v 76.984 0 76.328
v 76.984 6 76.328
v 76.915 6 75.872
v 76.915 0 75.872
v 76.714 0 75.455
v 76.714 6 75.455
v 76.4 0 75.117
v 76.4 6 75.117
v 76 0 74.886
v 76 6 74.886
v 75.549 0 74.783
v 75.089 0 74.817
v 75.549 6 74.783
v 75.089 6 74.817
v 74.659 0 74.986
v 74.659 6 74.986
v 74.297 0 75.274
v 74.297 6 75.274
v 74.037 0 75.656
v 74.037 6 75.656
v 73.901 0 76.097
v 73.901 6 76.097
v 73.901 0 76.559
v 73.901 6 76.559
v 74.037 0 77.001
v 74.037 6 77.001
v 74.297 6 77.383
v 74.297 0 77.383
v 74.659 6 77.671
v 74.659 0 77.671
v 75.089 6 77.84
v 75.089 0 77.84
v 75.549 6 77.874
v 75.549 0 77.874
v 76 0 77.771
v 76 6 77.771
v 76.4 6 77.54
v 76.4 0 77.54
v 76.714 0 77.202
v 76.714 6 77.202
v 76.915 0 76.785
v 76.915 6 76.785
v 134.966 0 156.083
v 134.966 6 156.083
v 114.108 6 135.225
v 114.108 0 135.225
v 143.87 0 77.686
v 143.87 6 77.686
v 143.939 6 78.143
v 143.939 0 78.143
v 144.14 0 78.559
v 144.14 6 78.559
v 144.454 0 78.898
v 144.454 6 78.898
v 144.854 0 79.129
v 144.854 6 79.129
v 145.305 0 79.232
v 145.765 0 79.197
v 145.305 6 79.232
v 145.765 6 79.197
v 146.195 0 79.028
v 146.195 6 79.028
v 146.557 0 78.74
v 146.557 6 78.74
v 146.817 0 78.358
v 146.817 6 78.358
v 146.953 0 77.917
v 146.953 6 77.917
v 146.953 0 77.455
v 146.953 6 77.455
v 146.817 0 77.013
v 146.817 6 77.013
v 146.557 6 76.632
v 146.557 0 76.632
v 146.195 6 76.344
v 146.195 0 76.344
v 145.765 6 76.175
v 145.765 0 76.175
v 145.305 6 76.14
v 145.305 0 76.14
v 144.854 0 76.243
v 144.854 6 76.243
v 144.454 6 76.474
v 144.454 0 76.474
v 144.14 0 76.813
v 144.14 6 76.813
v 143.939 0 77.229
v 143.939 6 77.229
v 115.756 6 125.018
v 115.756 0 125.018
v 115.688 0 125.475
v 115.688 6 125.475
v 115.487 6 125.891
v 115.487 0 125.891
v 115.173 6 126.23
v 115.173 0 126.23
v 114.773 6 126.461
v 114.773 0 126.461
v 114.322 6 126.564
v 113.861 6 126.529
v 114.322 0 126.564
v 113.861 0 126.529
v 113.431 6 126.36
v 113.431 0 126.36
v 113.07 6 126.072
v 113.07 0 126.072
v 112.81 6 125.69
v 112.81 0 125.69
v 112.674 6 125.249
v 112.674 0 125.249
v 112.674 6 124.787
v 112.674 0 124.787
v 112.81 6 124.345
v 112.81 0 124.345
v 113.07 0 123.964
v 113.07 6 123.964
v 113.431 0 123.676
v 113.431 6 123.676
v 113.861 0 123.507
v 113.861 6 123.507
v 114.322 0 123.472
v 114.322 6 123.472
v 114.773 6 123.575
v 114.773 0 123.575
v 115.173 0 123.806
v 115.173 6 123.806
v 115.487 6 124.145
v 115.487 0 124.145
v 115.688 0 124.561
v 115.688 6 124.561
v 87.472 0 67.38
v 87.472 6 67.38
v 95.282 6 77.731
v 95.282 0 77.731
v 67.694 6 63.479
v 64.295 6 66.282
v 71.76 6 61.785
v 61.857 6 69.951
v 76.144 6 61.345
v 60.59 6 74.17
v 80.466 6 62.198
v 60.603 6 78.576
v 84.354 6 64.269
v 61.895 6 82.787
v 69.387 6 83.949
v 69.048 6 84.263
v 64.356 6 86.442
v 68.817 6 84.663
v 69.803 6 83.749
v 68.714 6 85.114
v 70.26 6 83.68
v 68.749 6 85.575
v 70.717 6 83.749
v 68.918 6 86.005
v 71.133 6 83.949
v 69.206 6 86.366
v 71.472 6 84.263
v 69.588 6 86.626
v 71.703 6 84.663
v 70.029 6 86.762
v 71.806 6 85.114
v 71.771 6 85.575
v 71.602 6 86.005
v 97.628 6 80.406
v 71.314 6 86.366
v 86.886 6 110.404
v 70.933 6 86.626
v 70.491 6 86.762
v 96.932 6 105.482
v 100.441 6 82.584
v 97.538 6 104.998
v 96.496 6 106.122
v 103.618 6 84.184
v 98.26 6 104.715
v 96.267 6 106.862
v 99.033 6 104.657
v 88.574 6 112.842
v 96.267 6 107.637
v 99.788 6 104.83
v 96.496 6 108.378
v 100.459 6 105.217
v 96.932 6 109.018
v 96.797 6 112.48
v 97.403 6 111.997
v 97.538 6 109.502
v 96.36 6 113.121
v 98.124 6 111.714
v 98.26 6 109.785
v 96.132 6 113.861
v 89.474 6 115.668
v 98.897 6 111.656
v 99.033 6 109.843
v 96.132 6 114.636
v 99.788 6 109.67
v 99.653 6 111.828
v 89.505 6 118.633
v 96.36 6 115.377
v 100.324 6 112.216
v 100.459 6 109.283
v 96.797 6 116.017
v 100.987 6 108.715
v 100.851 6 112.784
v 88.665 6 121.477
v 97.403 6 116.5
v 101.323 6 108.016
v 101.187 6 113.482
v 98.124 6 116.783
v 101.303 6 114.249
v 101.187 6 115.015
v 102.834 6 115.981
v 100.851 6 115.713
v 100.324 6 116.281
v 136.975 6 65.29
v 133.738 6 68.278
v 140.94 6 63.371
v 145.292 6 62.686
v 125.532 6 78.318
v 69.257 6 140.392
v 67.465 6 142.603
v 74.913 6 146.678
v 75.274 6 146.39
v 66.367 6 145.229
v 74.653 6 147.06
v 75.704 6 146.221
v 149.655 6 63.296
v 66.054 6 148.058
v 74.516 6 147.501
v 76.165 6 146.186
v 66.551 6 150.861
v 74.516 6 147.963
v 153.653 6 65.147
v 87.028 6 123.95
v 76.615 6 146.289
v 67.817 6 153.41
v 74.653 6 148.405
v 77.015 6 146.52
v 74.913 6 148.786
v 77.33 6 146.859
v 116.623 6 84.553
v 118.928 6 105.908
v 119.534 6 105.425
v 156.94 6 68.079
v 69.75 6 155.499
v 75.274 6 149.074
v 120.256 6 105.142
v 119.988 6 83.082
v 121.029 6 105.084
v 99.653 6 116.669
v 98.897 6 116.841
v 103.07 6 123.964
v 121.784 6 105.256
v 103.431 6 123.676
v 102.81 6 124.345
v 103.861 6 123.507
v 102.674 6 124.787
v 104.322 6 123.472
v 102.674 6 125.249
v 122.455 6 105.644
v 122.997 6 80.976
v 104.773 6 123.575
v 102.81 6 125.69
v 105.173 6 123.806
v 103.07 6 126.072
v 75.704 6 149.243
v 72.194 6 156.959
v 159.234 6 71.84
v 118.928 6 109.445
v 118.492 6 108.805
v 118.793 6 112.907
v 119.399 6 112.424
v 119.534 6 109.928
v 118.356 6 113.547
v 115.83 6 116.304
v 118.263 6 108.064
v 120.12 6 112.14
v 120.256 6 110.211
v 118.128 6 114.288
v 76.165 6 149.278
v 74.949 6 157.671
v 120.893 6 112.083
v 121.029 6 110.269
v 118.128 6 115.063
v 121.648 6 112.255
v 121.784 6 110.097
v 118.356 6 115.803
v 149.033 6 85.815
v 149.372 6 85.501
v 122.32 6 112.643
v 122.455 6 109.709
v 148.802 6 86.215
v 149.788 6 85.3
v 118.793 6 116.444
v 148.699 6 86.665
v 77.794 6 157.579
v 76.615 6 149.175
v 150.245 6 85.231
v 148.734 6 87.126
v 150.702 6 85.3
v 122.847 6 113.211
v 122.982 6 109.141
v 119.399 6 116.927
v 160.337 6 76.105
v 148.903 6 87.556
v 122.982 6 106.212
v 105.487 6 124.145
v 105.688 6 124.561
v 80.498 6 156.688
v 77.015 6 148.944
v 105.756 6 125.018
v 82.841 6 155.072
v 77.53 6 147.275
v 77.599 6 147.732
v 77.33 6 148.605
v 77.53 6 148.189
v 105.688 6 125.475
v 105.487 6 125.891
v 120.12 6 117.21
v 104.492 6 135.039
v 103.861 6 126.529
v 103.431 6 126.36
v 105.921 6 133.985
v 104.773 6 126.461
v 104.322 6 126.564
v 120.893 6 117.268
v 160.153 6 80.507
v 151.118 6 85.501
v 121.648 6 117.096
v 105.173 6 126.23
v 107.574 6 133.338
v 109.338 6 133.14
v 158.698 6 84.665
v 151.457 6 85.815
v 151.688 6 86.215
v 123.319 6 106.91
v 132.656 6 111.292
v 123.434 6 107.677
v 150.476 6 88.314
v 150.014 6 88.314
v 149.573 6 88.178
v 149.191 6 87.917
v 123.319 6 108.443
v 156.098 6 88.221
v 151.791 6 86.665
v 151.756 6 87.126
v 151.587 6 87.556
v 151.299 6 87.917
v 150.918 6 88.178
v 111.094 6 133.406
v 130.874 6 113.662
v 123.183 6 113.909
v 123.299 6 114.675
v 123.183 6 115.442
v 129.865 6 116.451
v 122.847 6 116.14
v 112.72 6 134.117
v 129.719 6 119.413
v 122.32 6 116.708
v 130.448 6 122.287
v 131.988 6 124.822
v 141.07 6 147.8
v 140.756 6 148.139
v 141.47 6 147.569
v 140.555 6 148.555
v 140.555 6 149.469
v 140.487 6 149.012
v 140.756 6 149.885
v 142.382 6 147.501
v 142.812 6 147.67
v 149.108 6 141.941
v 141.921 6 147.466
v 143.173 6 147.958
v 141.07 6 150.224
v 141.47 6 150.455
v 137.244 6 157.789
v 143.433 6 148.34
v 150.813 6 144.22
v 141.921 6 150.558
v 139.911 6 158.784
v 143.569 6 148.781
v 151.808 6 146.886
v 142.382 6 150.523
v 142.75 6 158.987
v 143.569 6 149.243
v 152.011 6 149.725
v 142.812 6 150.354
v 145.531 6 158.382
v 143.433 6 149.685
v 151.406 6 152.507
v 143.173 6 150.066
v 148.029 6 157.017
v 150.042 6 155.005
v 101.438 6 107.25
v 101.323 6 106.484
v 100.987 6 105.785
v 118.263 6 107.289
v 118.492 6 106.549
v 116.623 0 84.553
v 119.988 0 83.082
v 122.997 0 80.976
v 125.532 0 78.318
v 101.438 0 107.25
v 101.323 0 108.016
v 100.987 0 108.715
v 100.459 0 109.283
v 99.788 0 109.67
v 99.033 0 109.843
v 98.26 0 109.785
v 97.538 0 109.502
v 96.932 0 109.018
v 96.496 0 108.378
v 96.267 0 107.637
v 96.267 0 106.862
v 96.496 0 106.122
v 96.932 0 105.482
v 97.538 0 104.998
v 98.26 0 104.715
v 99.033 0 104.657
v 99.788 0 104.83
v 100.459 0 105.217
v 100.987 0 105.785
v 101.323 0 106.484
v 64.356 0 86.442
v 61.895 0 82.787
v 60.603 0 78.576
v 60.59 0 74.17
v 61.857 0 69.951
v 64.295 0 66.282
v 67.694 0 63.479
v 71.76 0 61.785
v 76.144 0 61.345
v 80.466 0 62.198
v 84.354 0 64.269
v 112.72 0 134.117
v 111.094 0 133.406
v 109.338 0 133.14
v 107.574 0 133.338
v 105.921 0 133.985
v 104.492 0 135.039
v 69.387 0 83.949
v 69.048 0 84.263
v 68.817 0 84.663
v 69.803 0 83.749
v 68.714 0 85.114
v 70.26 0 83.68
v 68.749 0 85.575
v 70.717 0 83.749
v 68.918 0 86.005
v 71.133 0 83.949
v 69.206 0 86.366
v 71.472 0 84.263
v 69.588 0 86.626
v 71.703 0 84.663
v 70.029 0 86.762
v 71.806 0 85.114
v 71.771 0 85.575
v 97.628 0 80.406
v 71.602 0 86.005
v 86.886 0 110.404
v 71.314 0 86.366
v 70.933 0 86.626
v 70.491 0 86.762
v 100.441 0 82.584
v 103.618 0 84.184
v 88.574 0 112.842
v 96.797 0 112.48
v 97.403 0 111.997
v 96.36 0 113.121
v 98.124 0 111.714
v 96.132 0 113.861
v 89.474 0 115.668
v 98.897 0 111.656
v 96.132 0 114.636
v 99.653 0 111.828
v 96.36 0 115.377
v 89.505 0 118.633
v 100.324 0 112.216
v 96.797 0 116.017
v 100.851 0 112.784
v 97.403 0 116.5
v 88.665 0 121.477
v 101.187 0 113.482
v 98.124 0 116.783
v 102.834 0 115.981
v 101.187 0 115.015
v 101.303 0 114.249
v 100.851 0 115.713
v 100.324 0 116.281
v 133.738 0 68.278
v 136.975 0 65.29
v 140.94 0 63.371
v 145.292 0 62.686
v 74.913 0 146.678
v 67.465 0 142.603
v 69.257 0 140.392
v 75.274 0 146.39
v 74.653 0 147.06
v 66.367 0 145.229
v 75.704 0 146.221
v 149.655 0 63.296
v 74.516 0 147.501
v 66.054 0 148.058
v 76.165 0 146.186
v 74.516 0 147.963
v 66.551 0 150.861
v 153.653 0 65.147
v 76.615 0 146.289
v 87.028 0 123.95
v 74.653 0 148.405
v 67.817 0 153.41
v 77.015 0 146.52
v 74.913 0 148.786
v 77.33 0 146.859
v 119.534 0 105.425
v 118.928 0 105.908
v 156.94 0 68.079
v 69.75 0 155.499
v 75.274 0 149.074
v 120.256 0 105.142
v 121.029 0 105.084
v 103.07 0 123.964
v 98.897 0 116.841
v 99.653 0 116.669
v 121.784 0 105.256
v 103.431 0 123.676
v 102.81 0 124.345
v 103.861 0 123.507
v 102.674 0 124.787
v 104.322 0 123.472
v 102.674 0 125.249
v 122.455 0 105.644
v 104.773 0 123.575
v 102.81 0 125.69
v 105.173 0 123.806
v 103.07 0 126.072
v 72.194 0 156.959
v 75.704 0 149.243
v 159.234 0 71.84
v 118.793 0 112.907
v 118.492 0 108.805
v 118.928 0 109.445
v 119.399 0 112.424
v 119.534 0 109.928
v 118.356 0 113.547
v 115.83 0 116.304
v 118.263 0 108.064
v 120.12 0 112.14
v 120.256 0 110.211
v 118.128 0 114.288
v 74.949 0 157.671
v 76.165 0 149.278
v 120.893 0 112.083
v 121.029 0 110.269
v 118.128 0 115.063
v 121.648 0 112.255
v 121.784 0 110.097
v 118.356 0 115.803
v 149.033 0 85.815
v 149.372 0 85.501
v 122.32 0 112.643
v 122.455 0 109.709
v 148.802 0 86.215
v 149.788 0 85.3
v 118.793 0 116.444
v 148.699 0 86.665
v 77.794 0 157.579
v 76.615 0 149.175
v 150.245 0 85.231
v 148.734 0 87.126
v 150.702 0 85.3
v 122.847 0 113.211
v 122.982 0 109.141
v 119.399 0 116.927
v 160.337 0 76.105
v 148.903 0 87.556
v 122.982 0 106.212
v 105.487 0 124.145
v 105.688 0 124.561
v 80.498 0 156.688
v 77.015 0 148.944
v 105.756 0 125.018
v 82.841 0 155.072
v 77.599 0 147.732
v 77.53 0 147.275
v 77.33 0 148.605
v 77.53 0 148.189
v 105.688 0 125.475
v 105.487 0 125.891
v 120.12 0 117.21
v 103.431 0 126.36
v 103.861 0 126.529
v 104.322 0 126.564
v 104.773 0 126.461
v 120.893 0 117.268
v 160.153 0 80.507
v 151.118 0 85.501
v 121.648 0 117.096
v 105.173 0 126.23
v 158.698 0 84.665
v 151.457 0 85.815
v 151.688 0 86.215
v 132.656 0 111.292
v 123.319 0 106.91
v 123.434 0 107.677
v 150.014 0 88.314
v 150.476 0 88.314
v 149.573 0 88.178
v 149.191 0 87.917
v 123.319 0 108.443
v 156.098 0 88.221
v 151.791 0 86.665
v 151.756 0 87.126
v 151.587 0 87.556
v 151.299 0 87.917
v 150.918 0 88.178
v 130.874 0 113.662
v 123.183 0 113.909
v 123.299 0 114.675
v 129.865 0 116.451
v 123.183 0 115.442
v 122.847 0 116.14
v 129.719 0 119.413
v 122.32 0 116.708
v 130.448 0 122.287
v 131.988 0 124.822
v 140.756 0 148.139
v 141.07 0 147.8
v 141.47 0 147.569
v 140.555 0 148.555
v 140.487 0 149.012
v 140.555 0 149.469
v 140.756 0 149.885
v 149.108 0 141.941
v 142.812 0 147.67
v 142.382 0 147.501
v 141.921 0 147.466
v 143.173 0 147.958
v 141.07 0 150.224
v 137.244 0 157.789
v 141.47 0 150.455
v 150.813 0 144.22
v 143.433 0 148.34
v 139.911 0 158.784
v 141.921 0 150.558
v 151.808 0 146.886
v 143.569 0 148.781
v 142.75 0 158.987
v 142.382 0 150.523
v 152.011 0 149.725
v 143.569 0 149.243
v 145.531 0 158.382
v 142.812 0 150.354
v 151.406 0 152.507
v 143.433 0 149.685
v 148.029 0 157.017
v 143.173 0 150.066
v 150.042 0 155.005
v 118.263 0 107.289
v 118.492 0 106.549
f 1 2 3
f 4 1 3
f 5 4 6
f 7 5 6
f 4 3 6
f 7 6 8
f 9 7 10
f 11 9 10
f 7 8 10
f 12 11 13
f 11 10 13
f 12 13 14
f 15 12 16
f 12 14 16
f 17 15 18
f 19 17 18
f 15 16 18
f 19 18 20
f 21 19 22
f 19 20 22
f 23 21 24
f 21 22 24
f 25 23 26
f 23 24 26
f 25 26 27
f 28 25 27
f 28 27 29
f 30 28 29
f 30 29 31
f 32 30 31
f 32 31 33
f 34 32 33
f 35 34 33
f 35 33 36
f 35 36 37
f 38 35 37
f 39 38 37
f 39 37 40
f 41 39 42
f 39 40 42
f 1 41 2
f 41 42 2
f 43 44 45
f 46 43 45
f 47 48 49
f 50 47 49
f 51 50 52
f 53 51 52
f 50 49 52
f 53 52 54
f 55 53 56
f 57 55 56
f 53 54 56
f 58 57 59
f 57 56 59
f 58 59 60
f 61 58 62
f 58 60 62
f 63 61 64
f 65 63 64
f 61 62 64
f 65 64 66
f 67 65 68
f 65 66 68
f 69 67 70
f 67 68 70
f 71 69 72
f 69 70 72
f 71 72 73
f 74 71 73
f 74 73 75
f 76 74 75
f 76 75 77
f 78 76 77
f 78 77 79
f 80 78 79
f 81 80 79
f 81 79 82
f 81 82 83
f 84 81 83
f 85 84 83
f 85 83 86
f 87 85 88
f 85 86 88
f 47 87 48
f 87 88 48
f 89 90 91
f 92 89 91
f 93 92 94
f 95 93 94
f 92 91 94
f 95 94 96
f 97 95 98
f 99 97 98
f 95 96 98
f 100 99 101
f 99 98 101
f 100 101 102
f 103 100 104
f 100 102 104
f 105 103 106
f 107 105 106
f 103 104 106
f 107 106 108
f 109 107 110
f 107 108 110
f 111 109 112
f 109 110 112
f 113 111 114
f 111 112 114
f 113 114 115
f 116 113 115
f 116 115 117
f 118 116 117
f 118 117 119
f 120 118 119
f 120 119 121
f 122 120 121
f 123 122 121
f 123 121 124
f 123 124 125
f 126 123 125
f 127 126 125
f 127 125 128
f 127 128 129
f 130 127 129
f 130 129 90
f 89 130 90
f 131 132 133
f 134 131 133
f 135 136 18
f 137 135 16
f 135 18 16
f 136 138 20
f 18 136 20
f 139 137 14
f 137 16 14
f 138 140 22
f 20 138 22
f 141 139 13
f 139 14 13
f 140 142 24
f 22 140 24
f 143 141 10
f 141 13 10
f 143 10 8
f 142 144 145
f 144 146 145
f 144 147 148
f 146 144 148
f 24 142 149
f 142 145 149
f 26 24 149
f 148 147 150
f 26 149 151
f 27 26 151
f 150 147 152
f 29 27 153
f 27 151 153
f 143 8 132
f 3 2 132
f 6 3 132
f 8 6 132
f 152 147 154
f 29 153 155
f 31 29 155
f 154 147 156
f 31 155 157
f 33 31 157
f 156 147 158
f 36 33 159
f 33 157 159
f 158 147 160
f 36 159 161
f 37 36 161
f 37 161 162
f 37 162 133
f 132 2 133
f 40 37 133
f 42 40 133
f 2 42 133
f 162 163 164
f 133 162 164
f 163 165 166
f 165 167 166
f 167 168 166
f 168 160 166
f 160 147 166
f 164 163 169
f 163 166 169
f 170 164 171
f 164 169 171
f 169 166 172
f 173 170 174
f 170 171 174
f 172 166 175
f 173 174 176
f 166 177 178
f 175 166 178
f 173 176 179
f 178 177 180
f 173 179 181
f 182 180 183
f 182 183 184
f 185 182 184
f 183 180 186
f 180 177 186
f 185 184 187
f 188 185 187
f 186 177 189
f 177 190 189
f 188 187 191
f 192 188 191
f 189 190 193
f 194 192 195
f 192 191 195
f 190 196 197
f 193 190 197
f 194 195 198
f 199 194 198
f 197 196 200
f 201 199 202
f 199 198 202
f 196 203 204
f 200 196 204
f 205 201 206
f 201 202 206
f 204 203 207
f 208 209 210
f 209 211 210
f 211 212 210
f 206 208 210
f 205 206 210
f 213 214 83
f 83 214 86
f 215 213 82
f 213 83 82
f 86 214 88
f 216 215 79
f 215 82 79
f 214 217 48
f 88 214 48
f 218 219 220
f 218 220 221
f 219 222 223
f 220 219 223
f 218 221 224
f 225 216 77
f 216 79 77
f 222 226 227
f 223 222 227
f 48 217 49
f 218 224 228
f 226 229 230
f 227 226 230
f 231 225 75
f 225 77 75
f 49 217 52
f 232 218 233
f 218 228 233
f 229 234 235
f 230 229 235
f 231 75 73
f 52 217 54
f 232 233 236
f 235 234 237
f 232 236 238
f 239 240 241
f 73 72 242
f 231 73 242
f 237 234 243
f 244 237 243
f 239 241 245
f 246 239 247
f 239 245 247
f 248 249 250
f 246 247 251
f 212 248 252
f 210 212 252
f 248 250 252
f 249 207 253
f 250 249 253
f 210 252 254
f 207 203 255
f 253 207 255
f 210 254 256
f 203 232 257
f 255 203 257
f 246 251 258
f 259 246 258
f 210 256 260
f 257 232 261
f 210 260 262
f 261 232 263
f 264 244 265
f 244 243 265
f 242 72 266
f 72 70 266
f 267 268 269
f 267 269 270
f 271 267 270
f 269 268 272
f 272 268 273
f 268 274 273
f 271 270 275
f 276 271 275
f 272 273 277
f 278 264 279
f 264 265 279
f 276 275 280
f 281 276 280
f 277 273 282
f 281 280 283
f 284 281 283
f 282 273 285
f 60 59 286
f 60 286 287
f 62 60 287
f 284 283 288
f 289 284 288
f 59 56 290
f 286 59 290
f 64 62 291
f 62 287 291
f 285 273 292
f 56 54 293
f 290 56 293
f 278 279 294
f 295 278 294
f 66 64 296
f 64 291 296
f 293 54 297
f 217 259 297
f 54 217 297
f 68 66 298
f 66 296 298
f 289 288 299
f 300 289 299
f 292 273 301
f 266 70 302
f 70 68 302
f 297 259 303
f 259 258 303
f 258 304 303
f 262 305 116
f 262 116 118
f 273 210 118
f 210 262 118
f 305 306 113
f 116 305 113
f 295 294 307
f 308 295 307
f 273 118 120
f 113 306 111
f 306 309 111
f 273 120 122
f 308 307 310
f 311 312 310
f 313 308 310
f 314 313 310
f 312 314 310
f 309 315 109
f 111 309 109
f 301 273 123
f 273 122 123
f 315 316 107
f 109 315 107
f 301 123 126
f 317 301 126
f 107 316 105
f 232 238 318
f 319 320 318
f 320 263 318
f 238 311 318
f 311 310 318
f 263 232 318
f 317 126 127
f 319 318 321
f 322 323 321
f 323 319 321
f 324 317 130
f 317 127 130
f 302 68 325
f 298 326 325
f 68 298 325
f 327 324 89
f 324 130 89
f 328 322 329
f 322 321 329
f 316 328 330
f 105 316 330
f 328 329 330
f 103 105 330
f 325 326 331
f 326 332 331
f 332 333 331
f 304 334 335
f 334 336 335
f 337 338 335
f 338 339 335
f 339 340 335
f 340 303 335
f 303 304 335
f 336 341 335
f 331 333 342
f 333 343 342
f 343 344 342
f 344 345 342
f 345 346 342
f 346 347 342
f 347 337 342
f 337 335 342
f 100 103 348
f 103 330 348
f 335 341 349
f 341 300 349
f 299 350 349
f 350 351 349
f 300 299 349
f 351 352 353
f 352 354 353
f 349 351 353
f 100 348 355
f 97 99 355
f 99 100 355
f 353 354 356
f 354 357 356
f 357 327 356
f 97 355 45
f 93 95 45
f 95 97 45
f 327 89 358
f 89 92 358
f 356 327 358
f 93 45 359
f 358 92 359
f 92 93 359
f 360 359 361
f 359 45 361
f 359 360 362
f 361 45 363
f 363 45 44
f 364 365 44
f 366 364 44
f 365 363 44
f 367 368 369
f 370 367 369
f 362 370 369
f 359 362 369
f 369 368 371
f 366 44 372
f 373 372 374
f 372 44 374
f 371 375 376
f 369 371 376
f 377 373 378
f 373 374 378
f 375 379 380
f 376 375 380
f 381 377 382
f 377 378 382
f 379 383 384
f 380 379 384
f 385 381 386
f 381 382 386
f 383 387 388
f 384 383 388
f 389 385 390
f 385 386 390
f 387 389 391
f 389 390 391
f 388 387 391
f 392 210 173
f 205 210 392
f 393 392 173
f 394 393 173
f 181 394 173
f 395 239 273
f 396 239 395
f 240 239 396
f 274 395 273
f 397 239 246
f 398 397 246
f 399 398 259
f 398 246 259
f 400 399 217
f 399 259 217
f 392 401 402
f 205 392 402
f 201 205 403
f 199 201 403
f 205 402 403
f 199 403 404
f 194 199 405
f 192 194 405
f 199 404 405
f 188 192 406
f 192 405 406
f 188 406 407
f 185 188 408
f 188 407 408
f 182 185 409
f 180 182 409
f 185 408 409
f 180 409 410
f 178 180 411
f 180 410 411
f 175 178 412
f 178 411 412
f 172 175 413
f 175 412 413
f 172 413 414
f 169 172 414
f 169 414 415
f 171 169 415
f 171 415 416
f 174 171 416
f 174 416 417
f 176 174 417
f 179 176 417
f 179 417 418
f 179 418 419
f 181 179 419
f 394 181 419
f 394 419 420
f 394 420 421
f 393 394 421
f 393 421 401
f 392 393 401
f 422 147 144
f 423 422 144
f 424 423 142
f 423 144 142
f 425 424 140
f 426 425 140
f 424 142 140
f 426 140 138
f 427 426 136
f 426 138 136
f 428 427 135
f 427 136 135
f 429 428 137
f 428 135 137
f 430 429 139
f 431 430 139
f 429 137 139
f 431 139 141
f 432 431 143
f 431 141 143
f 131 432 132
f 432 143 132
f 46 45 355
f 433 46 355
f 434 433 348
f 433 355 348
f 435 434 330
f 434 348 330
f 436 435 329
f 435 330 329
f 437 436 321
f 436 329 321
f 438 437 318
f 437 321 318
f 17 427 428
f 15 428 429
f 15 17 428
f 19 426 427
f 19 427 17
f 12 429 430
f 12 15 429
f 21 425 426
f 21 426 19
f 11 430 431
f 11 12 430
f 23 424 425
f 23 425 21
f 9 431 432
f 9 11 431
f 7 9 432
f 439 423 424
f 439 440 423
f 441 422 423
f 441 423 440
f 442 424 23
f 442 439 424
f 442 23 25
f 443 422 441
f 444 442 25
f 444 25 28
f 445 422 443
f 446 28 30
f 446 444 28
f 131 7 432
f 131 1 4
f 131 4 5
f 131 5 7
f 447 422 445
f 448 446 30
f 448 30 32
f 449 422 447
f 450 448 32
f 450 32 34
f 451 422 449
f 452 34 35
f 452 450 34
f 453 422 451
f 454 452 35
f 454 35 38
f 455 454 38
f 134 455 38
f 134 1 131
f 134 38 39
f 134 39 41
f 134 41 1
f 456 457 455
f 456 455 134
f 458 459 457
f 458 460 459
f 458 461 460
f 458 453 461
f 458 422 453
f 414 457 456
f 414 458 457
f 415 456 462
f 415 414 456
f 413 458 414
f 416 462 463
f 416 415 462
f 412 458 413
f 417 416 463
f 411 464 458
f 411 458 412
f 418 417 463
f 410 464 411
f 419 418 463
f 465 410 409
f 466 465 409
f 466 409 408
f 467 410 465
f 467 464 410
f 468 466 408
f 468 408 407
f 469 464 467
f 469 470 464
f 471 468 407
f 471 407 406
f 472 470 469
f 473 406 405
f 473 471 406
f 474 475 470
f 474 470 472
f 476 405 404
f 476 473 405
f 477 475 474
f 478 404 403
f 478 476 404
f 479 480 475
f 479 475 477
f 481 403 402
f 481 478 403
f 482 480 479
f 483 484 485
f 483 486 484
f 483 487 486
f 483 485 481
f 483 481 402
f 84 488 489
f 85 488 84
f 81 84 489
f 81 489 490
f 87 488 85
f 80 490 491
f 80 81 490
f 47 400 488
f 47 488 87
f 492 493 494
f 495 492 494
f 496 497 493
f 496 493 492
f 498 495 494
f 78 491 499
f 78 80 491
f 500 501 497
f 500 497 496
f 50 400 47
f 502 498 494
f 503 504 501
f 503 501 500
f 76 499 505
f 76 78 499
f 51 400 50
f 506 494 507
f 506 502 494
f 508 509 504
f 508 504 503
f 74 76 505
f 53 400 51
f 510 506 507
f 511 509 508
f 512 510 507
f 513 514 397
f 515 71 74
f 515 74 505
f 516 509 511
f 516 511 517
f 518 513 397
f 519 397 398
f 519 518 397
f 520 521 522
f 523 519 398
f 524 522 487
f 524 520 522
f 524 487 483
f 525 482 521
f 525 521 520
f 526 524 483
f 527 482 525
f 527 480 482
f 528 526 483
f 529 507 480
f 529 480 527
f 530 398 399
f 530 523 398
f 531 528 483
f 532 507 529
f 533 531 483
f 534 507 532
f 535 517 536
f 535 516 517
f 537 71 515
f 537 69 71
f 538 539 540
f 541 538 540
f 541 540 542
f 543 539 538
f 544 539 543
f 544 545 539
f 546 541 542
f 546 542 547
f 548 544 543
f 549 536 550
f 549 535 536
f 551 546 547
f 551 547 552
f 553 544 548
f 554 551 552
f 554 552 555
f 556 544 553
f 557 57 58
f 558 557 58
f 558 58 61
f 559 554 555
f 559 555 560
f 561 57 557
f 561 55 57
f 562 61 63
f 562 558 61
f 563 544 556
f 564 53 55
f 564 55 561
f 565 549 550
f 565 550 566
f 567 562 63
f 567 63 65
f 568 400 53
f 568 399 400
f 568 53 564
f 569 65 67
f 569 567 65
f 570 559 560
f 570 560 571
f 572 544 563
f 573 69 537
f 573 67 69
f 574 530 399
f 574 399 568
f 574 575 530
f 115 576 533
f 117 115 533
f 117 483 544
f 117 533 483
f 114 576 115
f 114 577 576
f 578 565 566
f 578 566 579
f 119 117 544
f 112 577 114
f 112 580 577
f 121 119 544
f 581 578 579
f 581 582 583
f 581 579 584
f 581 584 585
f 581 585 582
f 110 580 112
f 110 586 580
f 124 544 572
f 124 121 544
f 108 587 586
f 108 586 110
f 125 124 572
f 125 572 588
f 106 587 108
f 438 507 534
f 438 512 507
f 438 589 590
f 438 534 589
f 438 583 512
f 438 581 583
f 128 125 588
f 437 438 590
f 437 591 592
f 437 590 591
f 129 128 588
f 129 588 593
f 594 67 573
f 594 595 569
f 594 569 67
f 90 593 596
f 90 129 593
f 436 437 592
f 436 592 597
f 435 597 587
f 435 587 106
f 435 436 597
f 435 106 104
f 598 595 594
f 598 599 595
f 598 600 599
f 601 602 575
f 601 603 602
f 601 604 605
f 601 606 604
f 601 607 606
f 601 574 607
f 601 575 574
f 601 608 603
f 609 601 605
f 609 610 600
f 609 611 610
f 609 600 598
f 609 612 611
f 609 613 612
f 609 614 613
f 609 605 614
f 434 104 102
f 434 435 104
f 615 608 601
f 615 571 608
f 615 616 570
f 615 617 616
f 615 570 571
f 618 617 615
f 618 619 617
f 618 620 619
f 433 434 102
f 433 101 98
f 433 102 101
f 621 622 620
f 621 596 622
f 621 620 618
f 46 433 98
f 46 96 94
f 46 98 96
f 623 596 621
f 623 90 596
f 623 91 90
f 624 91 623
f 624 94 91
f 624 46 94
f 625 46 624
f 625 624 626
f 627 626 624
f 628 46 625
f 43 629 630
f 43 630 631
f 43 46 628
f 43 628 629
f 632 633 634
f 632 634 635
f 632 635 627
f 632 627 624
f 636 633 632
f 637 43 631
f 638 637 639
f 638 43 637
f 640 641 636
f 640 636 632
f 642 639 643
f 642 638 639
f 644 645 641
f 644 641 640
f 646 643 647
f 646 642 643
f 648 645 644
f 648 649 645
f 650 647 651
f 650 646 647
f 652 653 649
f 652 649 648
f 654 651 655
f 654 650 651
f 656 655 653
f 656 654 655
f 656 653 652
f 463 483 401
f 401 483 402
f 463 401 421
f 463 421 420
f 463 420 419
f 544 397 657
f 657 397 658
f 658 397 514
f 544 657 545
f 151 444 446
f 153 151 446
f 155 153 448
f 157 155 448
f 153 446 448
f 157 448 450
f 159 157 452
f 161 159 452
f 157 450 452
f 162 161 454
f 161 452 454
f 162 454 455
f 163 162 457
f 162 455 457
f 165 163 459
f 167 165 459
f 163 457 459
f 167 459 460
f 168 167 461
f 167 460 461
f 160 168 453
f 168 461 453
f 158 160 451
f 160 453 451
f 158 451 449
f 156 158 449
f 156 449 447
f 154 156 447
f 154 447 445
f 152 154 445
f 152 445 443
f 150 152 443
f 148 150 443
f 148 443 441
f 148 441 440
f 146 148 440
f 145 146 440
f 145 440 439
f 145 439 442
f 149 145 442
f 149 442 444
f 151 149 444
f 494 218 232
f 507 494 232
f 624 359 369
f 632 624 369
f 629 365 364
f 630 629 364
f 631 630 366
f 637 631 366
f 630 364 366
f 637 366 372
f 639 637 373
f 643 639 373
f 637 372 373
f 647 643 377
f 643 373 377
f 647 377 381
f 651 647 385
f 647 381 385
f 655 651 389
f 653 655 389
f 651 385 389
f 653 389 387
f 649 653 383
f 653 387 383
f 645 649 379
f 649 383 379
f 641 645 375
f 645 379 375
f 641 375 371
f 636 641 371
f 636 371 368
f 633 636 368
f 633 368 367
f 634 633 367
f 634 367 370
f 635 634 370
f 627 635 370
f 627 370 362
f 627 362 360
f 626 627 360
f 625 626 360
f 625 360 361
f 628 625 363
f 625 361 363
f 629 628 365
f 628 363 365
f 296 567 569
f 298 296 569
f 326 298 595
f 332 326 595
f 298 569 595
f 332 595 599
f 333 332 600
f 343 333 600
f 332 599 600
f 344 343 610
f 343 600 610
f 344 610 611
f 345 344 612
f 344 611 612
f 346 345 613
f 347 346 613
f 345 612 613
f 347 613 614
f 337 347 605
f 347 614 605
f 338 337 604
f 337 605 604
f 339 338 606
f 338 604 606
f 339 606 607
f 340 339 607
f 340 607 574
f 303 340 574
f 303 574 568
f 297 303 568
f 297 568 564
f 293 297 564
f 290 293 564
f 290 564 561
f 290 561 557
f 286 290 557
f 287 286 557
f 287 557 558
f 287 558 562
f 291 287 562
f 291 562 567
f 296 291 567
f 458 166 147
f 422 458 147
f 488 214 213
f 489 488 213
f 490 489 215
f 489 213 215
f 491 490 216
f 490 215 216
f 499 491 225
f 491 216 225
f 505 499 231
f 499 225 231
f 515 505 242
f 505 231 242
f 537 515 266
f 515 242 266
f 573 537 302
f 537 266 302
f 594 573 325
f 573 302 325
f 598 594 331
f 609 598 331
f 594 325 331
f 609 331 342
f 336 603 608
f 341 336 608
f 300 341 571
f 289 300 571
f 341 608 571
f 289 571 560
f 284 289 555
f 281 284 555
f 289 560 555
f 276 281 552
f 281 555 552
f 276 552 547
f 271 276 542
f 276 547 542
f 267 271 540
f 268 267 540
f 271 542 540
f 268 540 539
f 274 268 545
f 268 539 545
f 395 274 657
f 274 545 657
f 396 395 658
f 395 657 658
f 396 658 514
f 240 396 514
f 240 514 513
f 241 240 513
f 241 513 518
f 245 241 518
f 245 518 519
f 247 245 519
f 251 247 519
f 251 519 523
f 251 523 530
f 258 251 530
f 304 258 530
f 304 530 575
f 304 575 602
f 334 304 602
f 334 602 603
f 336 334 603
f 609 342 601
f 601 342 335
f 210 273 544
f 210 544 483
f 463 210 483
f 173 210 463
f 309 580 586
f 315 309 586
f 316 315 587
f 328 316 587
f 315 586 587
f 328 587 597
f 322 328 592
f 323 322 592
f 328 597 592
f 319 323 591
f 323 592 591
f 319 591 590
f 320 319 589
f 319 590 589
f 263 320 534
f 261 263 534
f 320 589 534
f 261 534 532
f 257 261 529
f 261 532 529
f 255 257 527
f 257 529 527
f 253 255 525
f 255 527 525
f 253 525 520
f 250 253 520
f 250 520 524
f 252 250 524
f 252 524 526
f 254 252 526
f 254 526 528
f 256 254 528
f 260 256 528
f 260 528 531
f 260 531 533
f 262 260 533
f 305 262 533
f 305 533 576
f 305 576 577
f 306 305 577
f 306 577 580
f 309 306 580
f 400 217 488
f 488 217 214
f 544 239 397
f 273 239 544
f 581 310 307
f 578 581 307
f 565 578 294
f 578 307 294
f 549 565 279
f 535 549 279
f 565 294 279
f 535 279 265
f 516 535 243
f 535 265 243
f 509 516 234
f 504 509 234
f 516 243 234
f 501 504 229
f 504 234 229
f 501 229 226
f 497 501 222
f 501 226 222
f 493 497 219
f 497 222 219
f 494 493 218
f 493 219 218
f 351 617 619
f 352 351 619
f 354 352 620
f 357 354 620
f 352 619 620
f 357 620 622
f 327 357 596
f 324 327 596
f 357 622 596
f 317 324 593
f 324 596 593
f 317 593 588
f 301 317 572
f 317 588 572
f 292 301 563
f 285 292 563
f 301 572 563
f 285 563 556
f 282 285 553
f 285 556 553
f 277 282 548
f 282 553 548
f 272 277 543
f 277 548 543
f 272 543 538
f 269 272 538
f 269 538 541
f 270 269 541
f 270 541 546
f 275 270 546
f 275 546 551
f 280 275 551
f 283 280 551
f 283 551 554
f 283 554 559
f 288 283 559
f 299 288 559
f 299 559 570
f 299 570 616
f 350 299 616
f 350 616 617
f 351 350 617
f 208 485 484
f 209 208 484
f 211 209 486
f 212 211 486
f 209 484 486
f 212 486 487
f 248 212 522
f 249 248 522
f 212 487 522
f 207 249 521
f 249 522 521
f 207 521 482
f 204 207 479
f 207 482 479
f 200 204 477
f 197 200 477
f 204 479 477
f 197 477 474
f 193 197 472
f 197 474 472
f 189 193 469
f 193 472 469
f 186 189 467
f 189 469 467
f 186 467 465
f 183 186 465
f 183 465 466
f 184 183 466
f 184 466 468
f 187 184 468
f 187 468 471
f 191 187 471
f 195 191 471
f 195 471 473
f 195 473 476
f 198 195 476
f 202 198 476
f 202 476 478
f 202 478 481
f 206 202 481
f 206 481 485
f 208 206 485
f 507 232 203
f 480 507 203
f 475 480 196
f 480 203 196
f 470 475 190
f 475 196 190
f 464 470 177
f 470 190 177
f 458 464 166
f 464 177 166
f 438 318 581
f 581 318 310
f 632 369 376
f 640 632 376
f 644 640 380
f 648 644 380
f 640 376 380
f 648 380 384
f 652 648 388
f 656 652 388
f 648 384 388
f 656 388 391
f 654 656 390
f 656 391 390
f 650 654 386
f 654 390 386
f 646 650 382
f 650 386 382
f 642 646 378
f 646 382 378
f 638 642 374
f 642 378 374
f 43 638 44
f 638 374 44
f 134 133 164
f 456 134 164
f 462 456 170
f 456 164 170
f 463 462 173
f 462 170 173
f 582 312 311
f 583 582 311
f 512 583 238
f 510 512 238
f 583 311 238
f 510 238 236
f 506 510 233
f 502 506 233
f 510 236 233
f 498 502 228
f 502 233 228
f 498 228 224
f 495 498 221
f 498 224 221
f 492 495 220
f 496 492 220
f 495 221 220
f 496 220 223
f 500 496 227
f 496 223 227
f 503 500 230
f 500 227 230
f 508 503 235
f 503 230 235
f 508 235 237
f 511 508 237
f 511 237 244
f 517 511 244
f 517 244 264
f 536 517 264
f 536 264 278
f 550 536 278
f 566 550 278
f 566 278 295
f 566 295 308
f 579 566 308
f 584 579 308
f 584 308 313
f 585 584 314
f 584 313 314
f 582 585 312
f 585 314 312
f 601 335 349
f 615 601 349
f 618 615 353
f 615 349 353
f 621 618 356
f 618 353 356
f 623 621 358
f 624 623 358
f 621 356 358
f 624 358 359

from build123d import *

# Parameters (mm, degrees)
SZKIC13_R                   = 1.55
DODANIE_WYCI_GNI_CIE3_DEPTH = 6
SZKIC15_R                   = 2.6
WYTNIJ_WYCI_GNI_CIE3_DEPTH  = 226.954786153
SZKIC17_R                   = 1.550000001
WYTNIJ_WYCI_GNI_CIE4_DEPTH  = 10
WYTNIJ_WYCI_GNI_CIE5_START  = -10
WYTNIJ_WYCI_GNI_CIE5_DEPTH  = 10
SZKIC19_R                   = 1.55
WYTNIJ_WYCI_GNI_CIE6_DEPTH  = 10


with BuildPart() as part:
    # Szkic13 → Dodanie-wyciągnięcie3 (new body)
    with BuildSketch(Plane(origin=(79.289240162, 6, 79.289240162), x_dir=(-1, 0, 0), z_dir=(0, 1, 0))):
        with BuildLine():
            Line((-25.202360127, 55.749482984), (-3.551339243, 75.782812897))
            ThreePointArc((-3.551339243, 75.782812897), (10.580158874, 75.234396129), (10.031742107, 61.102898012))
            Line((10.031742107, 61.102898012), (-7.738470336, 44.660415673))
            ThreePointArc((-7.738470336, 44.660415673), (-10.310546151, 37.859798404), (-7.5965153, 31.114577446))
            Line((-7.5965153, 31.114577446), (14.933655573, 7.152316182))
            ThreePointArc((14.933655573, 7.152316182), (13.398314201, -14.533932284), (-8.183163771, -11.908964821))
            Line((-8.183163771, -11.908964821), (-15.992976767, -1.557886957))
            ThreePointArc((-15.992976767, -1.557886957), (-22.556998647, 4.097640789), (-30.974241603, 6.152244974))
            ThreePointArc((-30.974241603, 6.152244974), (-39.464828567, 4.425597836), (-46.243228353, -0.971130216))
            Line((-46.243228353, -0.971130216), (-54.448570559, -11.011566026))
            ThreePointArc((-54.448570559, -11.011566026), (-76.115608669, -12.797652588), (-76.808825852, 8.931822684))
            Line((-76.808825852, 8.931822684), (-53.366371193, 32.002364161))
            ThreePointArc((-53.366371193, 32.002364161), (-50.392809402, 38.637264273), (-52.699229936, 45.532508544))
            Line((-52.699229936, 45.532508544), (-69.818454156, 62.651732764))
            ThreePointArc((-69.818454156, 62.651732764), (-69.818454156, 76.793868387), (-55.676318532, 76.793868387))
            Line((-55.676318532, 76.793868387), (-34.818454156, 55.936004011))
            ThreePointArc((-34.818454156, 55.936004011), (-30.049036911, 53.851185216), (-25.202360127, 55.749482984))
        make_face()
        with Locations((-62.747386344, 69.722800575)):
            Circle(SZKIC13_R, mode=Mode.SUBTRACT)
        with Locations(Location((3.855577347, -2.960852601, 0), (0, 0, 180))):
            Circle(SZKIC13_R, mode=Mode.SUBTRACT)
        with Locations(Location((3.240201432, 68.442855454, 0), (0, 0, 180))):
            Circle(SZKIC13_R, mode=Mode.SUBTRACT)
        with Locations((-66.131258172, -1.603335049)):
            Circle(SZKIC13_R, mode=Mode.SUBTRACT)
    extrude(amount=-DODANIE_WYCI_GNI_CIE3_DEPTH)

    # Szkic15 → Wytnij-wyciągnięcie3 (cut, through all)
    with BuildSketch(Plane(origin=(0, 0, 0), x_dir=(0.707106781186548, 0, 0.7071067811865471), z_dir=(0, -1, 0))):
        with Locations(Location((145.72647023, 5.947865628, 0), (0, 0, 315))):
            Circle(SZKIC15_R)
        with Locations(Location((150.579295842, 10.992673214, 0), (0, 0, 315))):
            Circle(SZKIC15_R)
        with Locations(Location((161.581579785, -9.30387201, 0), (0, 0, 315))):
            Circle(SZKIC15_R)
        with Locations(Location((166.434405397, -4.259064425, 0), (0, 0, 315))):
            Circle(SZKIC15_R)
    extrude(amount=-WYTNIJ_WYCI_GNI_CIE3_DEPTH, mode=Mode.SUBTRACT)

    # Szkic17 → Wytnij-wyciągnięcie4 (cut)
    with BuildSketch(Plane(origin=(0, 0, 0), x_dir=(0.7071067811865479, 0, 0.7071067811865472), z_dir=(0, -1, 0))):
        with Locations(Location((109.947888172, 10.585151125, 0), (0, 0, 225))):
            Circle(SZKIC17_R)
        with Locations(Location((167.602832009, -44.875713015, 0), (0, 0, 225))):
            Circle(SZKIC17_R)
    extrude(amount=-WYTNIJ_WYCI_GNI_CIE4_DEPTH, mode=Mode.SUBTRACT)

    # Szkic18 → Wytnij-wyciągnięcie5 (cut)
    with BuildSketch(Plane.XZ.offset(WYTNIJ_WYCI_GNI_CIE5_START)):
        with BuildLine():
            Line((116.622706822, 84.5530515), (115.830023537, 116.303650978))
            Line((115.830023537, 116.303650978), (102.834025094, 115.981122728))
            Line((102.834025094, 115.981122728), (103.61834975, 84.184343244))
            ThreePointArc((103.61834975, 84.184343244), (106.883098894, 85.118528612), (110.263481765, 85.441485136))
            ThreePointArc((110.263481765, 85.441485136), (113.481855081, 85.274710056), (116.622706822, 84.5530515))
        make_face()
    extrude(amount=WYTNIJ_WYCI_GNI_CIE5_DEPTH, mode=Mode.SUBTRACT)

    # Szkic19 → Wytnij-wyciągnięcie6 (cut)
    with BuildSketch(Plane.XZ):
        with Locations((104.20638679, 125.017952482)):
            Circle(SZKIC19_R)
        with Locations((114.20638679, 125.017952482)):
            Circle(SZKIC19_R)
    extrude(amount=-WYTNIJ_WYCI_GNI_CIE6_DEPTH, mode=Mode.SUBTRACT)


solid = part.part
